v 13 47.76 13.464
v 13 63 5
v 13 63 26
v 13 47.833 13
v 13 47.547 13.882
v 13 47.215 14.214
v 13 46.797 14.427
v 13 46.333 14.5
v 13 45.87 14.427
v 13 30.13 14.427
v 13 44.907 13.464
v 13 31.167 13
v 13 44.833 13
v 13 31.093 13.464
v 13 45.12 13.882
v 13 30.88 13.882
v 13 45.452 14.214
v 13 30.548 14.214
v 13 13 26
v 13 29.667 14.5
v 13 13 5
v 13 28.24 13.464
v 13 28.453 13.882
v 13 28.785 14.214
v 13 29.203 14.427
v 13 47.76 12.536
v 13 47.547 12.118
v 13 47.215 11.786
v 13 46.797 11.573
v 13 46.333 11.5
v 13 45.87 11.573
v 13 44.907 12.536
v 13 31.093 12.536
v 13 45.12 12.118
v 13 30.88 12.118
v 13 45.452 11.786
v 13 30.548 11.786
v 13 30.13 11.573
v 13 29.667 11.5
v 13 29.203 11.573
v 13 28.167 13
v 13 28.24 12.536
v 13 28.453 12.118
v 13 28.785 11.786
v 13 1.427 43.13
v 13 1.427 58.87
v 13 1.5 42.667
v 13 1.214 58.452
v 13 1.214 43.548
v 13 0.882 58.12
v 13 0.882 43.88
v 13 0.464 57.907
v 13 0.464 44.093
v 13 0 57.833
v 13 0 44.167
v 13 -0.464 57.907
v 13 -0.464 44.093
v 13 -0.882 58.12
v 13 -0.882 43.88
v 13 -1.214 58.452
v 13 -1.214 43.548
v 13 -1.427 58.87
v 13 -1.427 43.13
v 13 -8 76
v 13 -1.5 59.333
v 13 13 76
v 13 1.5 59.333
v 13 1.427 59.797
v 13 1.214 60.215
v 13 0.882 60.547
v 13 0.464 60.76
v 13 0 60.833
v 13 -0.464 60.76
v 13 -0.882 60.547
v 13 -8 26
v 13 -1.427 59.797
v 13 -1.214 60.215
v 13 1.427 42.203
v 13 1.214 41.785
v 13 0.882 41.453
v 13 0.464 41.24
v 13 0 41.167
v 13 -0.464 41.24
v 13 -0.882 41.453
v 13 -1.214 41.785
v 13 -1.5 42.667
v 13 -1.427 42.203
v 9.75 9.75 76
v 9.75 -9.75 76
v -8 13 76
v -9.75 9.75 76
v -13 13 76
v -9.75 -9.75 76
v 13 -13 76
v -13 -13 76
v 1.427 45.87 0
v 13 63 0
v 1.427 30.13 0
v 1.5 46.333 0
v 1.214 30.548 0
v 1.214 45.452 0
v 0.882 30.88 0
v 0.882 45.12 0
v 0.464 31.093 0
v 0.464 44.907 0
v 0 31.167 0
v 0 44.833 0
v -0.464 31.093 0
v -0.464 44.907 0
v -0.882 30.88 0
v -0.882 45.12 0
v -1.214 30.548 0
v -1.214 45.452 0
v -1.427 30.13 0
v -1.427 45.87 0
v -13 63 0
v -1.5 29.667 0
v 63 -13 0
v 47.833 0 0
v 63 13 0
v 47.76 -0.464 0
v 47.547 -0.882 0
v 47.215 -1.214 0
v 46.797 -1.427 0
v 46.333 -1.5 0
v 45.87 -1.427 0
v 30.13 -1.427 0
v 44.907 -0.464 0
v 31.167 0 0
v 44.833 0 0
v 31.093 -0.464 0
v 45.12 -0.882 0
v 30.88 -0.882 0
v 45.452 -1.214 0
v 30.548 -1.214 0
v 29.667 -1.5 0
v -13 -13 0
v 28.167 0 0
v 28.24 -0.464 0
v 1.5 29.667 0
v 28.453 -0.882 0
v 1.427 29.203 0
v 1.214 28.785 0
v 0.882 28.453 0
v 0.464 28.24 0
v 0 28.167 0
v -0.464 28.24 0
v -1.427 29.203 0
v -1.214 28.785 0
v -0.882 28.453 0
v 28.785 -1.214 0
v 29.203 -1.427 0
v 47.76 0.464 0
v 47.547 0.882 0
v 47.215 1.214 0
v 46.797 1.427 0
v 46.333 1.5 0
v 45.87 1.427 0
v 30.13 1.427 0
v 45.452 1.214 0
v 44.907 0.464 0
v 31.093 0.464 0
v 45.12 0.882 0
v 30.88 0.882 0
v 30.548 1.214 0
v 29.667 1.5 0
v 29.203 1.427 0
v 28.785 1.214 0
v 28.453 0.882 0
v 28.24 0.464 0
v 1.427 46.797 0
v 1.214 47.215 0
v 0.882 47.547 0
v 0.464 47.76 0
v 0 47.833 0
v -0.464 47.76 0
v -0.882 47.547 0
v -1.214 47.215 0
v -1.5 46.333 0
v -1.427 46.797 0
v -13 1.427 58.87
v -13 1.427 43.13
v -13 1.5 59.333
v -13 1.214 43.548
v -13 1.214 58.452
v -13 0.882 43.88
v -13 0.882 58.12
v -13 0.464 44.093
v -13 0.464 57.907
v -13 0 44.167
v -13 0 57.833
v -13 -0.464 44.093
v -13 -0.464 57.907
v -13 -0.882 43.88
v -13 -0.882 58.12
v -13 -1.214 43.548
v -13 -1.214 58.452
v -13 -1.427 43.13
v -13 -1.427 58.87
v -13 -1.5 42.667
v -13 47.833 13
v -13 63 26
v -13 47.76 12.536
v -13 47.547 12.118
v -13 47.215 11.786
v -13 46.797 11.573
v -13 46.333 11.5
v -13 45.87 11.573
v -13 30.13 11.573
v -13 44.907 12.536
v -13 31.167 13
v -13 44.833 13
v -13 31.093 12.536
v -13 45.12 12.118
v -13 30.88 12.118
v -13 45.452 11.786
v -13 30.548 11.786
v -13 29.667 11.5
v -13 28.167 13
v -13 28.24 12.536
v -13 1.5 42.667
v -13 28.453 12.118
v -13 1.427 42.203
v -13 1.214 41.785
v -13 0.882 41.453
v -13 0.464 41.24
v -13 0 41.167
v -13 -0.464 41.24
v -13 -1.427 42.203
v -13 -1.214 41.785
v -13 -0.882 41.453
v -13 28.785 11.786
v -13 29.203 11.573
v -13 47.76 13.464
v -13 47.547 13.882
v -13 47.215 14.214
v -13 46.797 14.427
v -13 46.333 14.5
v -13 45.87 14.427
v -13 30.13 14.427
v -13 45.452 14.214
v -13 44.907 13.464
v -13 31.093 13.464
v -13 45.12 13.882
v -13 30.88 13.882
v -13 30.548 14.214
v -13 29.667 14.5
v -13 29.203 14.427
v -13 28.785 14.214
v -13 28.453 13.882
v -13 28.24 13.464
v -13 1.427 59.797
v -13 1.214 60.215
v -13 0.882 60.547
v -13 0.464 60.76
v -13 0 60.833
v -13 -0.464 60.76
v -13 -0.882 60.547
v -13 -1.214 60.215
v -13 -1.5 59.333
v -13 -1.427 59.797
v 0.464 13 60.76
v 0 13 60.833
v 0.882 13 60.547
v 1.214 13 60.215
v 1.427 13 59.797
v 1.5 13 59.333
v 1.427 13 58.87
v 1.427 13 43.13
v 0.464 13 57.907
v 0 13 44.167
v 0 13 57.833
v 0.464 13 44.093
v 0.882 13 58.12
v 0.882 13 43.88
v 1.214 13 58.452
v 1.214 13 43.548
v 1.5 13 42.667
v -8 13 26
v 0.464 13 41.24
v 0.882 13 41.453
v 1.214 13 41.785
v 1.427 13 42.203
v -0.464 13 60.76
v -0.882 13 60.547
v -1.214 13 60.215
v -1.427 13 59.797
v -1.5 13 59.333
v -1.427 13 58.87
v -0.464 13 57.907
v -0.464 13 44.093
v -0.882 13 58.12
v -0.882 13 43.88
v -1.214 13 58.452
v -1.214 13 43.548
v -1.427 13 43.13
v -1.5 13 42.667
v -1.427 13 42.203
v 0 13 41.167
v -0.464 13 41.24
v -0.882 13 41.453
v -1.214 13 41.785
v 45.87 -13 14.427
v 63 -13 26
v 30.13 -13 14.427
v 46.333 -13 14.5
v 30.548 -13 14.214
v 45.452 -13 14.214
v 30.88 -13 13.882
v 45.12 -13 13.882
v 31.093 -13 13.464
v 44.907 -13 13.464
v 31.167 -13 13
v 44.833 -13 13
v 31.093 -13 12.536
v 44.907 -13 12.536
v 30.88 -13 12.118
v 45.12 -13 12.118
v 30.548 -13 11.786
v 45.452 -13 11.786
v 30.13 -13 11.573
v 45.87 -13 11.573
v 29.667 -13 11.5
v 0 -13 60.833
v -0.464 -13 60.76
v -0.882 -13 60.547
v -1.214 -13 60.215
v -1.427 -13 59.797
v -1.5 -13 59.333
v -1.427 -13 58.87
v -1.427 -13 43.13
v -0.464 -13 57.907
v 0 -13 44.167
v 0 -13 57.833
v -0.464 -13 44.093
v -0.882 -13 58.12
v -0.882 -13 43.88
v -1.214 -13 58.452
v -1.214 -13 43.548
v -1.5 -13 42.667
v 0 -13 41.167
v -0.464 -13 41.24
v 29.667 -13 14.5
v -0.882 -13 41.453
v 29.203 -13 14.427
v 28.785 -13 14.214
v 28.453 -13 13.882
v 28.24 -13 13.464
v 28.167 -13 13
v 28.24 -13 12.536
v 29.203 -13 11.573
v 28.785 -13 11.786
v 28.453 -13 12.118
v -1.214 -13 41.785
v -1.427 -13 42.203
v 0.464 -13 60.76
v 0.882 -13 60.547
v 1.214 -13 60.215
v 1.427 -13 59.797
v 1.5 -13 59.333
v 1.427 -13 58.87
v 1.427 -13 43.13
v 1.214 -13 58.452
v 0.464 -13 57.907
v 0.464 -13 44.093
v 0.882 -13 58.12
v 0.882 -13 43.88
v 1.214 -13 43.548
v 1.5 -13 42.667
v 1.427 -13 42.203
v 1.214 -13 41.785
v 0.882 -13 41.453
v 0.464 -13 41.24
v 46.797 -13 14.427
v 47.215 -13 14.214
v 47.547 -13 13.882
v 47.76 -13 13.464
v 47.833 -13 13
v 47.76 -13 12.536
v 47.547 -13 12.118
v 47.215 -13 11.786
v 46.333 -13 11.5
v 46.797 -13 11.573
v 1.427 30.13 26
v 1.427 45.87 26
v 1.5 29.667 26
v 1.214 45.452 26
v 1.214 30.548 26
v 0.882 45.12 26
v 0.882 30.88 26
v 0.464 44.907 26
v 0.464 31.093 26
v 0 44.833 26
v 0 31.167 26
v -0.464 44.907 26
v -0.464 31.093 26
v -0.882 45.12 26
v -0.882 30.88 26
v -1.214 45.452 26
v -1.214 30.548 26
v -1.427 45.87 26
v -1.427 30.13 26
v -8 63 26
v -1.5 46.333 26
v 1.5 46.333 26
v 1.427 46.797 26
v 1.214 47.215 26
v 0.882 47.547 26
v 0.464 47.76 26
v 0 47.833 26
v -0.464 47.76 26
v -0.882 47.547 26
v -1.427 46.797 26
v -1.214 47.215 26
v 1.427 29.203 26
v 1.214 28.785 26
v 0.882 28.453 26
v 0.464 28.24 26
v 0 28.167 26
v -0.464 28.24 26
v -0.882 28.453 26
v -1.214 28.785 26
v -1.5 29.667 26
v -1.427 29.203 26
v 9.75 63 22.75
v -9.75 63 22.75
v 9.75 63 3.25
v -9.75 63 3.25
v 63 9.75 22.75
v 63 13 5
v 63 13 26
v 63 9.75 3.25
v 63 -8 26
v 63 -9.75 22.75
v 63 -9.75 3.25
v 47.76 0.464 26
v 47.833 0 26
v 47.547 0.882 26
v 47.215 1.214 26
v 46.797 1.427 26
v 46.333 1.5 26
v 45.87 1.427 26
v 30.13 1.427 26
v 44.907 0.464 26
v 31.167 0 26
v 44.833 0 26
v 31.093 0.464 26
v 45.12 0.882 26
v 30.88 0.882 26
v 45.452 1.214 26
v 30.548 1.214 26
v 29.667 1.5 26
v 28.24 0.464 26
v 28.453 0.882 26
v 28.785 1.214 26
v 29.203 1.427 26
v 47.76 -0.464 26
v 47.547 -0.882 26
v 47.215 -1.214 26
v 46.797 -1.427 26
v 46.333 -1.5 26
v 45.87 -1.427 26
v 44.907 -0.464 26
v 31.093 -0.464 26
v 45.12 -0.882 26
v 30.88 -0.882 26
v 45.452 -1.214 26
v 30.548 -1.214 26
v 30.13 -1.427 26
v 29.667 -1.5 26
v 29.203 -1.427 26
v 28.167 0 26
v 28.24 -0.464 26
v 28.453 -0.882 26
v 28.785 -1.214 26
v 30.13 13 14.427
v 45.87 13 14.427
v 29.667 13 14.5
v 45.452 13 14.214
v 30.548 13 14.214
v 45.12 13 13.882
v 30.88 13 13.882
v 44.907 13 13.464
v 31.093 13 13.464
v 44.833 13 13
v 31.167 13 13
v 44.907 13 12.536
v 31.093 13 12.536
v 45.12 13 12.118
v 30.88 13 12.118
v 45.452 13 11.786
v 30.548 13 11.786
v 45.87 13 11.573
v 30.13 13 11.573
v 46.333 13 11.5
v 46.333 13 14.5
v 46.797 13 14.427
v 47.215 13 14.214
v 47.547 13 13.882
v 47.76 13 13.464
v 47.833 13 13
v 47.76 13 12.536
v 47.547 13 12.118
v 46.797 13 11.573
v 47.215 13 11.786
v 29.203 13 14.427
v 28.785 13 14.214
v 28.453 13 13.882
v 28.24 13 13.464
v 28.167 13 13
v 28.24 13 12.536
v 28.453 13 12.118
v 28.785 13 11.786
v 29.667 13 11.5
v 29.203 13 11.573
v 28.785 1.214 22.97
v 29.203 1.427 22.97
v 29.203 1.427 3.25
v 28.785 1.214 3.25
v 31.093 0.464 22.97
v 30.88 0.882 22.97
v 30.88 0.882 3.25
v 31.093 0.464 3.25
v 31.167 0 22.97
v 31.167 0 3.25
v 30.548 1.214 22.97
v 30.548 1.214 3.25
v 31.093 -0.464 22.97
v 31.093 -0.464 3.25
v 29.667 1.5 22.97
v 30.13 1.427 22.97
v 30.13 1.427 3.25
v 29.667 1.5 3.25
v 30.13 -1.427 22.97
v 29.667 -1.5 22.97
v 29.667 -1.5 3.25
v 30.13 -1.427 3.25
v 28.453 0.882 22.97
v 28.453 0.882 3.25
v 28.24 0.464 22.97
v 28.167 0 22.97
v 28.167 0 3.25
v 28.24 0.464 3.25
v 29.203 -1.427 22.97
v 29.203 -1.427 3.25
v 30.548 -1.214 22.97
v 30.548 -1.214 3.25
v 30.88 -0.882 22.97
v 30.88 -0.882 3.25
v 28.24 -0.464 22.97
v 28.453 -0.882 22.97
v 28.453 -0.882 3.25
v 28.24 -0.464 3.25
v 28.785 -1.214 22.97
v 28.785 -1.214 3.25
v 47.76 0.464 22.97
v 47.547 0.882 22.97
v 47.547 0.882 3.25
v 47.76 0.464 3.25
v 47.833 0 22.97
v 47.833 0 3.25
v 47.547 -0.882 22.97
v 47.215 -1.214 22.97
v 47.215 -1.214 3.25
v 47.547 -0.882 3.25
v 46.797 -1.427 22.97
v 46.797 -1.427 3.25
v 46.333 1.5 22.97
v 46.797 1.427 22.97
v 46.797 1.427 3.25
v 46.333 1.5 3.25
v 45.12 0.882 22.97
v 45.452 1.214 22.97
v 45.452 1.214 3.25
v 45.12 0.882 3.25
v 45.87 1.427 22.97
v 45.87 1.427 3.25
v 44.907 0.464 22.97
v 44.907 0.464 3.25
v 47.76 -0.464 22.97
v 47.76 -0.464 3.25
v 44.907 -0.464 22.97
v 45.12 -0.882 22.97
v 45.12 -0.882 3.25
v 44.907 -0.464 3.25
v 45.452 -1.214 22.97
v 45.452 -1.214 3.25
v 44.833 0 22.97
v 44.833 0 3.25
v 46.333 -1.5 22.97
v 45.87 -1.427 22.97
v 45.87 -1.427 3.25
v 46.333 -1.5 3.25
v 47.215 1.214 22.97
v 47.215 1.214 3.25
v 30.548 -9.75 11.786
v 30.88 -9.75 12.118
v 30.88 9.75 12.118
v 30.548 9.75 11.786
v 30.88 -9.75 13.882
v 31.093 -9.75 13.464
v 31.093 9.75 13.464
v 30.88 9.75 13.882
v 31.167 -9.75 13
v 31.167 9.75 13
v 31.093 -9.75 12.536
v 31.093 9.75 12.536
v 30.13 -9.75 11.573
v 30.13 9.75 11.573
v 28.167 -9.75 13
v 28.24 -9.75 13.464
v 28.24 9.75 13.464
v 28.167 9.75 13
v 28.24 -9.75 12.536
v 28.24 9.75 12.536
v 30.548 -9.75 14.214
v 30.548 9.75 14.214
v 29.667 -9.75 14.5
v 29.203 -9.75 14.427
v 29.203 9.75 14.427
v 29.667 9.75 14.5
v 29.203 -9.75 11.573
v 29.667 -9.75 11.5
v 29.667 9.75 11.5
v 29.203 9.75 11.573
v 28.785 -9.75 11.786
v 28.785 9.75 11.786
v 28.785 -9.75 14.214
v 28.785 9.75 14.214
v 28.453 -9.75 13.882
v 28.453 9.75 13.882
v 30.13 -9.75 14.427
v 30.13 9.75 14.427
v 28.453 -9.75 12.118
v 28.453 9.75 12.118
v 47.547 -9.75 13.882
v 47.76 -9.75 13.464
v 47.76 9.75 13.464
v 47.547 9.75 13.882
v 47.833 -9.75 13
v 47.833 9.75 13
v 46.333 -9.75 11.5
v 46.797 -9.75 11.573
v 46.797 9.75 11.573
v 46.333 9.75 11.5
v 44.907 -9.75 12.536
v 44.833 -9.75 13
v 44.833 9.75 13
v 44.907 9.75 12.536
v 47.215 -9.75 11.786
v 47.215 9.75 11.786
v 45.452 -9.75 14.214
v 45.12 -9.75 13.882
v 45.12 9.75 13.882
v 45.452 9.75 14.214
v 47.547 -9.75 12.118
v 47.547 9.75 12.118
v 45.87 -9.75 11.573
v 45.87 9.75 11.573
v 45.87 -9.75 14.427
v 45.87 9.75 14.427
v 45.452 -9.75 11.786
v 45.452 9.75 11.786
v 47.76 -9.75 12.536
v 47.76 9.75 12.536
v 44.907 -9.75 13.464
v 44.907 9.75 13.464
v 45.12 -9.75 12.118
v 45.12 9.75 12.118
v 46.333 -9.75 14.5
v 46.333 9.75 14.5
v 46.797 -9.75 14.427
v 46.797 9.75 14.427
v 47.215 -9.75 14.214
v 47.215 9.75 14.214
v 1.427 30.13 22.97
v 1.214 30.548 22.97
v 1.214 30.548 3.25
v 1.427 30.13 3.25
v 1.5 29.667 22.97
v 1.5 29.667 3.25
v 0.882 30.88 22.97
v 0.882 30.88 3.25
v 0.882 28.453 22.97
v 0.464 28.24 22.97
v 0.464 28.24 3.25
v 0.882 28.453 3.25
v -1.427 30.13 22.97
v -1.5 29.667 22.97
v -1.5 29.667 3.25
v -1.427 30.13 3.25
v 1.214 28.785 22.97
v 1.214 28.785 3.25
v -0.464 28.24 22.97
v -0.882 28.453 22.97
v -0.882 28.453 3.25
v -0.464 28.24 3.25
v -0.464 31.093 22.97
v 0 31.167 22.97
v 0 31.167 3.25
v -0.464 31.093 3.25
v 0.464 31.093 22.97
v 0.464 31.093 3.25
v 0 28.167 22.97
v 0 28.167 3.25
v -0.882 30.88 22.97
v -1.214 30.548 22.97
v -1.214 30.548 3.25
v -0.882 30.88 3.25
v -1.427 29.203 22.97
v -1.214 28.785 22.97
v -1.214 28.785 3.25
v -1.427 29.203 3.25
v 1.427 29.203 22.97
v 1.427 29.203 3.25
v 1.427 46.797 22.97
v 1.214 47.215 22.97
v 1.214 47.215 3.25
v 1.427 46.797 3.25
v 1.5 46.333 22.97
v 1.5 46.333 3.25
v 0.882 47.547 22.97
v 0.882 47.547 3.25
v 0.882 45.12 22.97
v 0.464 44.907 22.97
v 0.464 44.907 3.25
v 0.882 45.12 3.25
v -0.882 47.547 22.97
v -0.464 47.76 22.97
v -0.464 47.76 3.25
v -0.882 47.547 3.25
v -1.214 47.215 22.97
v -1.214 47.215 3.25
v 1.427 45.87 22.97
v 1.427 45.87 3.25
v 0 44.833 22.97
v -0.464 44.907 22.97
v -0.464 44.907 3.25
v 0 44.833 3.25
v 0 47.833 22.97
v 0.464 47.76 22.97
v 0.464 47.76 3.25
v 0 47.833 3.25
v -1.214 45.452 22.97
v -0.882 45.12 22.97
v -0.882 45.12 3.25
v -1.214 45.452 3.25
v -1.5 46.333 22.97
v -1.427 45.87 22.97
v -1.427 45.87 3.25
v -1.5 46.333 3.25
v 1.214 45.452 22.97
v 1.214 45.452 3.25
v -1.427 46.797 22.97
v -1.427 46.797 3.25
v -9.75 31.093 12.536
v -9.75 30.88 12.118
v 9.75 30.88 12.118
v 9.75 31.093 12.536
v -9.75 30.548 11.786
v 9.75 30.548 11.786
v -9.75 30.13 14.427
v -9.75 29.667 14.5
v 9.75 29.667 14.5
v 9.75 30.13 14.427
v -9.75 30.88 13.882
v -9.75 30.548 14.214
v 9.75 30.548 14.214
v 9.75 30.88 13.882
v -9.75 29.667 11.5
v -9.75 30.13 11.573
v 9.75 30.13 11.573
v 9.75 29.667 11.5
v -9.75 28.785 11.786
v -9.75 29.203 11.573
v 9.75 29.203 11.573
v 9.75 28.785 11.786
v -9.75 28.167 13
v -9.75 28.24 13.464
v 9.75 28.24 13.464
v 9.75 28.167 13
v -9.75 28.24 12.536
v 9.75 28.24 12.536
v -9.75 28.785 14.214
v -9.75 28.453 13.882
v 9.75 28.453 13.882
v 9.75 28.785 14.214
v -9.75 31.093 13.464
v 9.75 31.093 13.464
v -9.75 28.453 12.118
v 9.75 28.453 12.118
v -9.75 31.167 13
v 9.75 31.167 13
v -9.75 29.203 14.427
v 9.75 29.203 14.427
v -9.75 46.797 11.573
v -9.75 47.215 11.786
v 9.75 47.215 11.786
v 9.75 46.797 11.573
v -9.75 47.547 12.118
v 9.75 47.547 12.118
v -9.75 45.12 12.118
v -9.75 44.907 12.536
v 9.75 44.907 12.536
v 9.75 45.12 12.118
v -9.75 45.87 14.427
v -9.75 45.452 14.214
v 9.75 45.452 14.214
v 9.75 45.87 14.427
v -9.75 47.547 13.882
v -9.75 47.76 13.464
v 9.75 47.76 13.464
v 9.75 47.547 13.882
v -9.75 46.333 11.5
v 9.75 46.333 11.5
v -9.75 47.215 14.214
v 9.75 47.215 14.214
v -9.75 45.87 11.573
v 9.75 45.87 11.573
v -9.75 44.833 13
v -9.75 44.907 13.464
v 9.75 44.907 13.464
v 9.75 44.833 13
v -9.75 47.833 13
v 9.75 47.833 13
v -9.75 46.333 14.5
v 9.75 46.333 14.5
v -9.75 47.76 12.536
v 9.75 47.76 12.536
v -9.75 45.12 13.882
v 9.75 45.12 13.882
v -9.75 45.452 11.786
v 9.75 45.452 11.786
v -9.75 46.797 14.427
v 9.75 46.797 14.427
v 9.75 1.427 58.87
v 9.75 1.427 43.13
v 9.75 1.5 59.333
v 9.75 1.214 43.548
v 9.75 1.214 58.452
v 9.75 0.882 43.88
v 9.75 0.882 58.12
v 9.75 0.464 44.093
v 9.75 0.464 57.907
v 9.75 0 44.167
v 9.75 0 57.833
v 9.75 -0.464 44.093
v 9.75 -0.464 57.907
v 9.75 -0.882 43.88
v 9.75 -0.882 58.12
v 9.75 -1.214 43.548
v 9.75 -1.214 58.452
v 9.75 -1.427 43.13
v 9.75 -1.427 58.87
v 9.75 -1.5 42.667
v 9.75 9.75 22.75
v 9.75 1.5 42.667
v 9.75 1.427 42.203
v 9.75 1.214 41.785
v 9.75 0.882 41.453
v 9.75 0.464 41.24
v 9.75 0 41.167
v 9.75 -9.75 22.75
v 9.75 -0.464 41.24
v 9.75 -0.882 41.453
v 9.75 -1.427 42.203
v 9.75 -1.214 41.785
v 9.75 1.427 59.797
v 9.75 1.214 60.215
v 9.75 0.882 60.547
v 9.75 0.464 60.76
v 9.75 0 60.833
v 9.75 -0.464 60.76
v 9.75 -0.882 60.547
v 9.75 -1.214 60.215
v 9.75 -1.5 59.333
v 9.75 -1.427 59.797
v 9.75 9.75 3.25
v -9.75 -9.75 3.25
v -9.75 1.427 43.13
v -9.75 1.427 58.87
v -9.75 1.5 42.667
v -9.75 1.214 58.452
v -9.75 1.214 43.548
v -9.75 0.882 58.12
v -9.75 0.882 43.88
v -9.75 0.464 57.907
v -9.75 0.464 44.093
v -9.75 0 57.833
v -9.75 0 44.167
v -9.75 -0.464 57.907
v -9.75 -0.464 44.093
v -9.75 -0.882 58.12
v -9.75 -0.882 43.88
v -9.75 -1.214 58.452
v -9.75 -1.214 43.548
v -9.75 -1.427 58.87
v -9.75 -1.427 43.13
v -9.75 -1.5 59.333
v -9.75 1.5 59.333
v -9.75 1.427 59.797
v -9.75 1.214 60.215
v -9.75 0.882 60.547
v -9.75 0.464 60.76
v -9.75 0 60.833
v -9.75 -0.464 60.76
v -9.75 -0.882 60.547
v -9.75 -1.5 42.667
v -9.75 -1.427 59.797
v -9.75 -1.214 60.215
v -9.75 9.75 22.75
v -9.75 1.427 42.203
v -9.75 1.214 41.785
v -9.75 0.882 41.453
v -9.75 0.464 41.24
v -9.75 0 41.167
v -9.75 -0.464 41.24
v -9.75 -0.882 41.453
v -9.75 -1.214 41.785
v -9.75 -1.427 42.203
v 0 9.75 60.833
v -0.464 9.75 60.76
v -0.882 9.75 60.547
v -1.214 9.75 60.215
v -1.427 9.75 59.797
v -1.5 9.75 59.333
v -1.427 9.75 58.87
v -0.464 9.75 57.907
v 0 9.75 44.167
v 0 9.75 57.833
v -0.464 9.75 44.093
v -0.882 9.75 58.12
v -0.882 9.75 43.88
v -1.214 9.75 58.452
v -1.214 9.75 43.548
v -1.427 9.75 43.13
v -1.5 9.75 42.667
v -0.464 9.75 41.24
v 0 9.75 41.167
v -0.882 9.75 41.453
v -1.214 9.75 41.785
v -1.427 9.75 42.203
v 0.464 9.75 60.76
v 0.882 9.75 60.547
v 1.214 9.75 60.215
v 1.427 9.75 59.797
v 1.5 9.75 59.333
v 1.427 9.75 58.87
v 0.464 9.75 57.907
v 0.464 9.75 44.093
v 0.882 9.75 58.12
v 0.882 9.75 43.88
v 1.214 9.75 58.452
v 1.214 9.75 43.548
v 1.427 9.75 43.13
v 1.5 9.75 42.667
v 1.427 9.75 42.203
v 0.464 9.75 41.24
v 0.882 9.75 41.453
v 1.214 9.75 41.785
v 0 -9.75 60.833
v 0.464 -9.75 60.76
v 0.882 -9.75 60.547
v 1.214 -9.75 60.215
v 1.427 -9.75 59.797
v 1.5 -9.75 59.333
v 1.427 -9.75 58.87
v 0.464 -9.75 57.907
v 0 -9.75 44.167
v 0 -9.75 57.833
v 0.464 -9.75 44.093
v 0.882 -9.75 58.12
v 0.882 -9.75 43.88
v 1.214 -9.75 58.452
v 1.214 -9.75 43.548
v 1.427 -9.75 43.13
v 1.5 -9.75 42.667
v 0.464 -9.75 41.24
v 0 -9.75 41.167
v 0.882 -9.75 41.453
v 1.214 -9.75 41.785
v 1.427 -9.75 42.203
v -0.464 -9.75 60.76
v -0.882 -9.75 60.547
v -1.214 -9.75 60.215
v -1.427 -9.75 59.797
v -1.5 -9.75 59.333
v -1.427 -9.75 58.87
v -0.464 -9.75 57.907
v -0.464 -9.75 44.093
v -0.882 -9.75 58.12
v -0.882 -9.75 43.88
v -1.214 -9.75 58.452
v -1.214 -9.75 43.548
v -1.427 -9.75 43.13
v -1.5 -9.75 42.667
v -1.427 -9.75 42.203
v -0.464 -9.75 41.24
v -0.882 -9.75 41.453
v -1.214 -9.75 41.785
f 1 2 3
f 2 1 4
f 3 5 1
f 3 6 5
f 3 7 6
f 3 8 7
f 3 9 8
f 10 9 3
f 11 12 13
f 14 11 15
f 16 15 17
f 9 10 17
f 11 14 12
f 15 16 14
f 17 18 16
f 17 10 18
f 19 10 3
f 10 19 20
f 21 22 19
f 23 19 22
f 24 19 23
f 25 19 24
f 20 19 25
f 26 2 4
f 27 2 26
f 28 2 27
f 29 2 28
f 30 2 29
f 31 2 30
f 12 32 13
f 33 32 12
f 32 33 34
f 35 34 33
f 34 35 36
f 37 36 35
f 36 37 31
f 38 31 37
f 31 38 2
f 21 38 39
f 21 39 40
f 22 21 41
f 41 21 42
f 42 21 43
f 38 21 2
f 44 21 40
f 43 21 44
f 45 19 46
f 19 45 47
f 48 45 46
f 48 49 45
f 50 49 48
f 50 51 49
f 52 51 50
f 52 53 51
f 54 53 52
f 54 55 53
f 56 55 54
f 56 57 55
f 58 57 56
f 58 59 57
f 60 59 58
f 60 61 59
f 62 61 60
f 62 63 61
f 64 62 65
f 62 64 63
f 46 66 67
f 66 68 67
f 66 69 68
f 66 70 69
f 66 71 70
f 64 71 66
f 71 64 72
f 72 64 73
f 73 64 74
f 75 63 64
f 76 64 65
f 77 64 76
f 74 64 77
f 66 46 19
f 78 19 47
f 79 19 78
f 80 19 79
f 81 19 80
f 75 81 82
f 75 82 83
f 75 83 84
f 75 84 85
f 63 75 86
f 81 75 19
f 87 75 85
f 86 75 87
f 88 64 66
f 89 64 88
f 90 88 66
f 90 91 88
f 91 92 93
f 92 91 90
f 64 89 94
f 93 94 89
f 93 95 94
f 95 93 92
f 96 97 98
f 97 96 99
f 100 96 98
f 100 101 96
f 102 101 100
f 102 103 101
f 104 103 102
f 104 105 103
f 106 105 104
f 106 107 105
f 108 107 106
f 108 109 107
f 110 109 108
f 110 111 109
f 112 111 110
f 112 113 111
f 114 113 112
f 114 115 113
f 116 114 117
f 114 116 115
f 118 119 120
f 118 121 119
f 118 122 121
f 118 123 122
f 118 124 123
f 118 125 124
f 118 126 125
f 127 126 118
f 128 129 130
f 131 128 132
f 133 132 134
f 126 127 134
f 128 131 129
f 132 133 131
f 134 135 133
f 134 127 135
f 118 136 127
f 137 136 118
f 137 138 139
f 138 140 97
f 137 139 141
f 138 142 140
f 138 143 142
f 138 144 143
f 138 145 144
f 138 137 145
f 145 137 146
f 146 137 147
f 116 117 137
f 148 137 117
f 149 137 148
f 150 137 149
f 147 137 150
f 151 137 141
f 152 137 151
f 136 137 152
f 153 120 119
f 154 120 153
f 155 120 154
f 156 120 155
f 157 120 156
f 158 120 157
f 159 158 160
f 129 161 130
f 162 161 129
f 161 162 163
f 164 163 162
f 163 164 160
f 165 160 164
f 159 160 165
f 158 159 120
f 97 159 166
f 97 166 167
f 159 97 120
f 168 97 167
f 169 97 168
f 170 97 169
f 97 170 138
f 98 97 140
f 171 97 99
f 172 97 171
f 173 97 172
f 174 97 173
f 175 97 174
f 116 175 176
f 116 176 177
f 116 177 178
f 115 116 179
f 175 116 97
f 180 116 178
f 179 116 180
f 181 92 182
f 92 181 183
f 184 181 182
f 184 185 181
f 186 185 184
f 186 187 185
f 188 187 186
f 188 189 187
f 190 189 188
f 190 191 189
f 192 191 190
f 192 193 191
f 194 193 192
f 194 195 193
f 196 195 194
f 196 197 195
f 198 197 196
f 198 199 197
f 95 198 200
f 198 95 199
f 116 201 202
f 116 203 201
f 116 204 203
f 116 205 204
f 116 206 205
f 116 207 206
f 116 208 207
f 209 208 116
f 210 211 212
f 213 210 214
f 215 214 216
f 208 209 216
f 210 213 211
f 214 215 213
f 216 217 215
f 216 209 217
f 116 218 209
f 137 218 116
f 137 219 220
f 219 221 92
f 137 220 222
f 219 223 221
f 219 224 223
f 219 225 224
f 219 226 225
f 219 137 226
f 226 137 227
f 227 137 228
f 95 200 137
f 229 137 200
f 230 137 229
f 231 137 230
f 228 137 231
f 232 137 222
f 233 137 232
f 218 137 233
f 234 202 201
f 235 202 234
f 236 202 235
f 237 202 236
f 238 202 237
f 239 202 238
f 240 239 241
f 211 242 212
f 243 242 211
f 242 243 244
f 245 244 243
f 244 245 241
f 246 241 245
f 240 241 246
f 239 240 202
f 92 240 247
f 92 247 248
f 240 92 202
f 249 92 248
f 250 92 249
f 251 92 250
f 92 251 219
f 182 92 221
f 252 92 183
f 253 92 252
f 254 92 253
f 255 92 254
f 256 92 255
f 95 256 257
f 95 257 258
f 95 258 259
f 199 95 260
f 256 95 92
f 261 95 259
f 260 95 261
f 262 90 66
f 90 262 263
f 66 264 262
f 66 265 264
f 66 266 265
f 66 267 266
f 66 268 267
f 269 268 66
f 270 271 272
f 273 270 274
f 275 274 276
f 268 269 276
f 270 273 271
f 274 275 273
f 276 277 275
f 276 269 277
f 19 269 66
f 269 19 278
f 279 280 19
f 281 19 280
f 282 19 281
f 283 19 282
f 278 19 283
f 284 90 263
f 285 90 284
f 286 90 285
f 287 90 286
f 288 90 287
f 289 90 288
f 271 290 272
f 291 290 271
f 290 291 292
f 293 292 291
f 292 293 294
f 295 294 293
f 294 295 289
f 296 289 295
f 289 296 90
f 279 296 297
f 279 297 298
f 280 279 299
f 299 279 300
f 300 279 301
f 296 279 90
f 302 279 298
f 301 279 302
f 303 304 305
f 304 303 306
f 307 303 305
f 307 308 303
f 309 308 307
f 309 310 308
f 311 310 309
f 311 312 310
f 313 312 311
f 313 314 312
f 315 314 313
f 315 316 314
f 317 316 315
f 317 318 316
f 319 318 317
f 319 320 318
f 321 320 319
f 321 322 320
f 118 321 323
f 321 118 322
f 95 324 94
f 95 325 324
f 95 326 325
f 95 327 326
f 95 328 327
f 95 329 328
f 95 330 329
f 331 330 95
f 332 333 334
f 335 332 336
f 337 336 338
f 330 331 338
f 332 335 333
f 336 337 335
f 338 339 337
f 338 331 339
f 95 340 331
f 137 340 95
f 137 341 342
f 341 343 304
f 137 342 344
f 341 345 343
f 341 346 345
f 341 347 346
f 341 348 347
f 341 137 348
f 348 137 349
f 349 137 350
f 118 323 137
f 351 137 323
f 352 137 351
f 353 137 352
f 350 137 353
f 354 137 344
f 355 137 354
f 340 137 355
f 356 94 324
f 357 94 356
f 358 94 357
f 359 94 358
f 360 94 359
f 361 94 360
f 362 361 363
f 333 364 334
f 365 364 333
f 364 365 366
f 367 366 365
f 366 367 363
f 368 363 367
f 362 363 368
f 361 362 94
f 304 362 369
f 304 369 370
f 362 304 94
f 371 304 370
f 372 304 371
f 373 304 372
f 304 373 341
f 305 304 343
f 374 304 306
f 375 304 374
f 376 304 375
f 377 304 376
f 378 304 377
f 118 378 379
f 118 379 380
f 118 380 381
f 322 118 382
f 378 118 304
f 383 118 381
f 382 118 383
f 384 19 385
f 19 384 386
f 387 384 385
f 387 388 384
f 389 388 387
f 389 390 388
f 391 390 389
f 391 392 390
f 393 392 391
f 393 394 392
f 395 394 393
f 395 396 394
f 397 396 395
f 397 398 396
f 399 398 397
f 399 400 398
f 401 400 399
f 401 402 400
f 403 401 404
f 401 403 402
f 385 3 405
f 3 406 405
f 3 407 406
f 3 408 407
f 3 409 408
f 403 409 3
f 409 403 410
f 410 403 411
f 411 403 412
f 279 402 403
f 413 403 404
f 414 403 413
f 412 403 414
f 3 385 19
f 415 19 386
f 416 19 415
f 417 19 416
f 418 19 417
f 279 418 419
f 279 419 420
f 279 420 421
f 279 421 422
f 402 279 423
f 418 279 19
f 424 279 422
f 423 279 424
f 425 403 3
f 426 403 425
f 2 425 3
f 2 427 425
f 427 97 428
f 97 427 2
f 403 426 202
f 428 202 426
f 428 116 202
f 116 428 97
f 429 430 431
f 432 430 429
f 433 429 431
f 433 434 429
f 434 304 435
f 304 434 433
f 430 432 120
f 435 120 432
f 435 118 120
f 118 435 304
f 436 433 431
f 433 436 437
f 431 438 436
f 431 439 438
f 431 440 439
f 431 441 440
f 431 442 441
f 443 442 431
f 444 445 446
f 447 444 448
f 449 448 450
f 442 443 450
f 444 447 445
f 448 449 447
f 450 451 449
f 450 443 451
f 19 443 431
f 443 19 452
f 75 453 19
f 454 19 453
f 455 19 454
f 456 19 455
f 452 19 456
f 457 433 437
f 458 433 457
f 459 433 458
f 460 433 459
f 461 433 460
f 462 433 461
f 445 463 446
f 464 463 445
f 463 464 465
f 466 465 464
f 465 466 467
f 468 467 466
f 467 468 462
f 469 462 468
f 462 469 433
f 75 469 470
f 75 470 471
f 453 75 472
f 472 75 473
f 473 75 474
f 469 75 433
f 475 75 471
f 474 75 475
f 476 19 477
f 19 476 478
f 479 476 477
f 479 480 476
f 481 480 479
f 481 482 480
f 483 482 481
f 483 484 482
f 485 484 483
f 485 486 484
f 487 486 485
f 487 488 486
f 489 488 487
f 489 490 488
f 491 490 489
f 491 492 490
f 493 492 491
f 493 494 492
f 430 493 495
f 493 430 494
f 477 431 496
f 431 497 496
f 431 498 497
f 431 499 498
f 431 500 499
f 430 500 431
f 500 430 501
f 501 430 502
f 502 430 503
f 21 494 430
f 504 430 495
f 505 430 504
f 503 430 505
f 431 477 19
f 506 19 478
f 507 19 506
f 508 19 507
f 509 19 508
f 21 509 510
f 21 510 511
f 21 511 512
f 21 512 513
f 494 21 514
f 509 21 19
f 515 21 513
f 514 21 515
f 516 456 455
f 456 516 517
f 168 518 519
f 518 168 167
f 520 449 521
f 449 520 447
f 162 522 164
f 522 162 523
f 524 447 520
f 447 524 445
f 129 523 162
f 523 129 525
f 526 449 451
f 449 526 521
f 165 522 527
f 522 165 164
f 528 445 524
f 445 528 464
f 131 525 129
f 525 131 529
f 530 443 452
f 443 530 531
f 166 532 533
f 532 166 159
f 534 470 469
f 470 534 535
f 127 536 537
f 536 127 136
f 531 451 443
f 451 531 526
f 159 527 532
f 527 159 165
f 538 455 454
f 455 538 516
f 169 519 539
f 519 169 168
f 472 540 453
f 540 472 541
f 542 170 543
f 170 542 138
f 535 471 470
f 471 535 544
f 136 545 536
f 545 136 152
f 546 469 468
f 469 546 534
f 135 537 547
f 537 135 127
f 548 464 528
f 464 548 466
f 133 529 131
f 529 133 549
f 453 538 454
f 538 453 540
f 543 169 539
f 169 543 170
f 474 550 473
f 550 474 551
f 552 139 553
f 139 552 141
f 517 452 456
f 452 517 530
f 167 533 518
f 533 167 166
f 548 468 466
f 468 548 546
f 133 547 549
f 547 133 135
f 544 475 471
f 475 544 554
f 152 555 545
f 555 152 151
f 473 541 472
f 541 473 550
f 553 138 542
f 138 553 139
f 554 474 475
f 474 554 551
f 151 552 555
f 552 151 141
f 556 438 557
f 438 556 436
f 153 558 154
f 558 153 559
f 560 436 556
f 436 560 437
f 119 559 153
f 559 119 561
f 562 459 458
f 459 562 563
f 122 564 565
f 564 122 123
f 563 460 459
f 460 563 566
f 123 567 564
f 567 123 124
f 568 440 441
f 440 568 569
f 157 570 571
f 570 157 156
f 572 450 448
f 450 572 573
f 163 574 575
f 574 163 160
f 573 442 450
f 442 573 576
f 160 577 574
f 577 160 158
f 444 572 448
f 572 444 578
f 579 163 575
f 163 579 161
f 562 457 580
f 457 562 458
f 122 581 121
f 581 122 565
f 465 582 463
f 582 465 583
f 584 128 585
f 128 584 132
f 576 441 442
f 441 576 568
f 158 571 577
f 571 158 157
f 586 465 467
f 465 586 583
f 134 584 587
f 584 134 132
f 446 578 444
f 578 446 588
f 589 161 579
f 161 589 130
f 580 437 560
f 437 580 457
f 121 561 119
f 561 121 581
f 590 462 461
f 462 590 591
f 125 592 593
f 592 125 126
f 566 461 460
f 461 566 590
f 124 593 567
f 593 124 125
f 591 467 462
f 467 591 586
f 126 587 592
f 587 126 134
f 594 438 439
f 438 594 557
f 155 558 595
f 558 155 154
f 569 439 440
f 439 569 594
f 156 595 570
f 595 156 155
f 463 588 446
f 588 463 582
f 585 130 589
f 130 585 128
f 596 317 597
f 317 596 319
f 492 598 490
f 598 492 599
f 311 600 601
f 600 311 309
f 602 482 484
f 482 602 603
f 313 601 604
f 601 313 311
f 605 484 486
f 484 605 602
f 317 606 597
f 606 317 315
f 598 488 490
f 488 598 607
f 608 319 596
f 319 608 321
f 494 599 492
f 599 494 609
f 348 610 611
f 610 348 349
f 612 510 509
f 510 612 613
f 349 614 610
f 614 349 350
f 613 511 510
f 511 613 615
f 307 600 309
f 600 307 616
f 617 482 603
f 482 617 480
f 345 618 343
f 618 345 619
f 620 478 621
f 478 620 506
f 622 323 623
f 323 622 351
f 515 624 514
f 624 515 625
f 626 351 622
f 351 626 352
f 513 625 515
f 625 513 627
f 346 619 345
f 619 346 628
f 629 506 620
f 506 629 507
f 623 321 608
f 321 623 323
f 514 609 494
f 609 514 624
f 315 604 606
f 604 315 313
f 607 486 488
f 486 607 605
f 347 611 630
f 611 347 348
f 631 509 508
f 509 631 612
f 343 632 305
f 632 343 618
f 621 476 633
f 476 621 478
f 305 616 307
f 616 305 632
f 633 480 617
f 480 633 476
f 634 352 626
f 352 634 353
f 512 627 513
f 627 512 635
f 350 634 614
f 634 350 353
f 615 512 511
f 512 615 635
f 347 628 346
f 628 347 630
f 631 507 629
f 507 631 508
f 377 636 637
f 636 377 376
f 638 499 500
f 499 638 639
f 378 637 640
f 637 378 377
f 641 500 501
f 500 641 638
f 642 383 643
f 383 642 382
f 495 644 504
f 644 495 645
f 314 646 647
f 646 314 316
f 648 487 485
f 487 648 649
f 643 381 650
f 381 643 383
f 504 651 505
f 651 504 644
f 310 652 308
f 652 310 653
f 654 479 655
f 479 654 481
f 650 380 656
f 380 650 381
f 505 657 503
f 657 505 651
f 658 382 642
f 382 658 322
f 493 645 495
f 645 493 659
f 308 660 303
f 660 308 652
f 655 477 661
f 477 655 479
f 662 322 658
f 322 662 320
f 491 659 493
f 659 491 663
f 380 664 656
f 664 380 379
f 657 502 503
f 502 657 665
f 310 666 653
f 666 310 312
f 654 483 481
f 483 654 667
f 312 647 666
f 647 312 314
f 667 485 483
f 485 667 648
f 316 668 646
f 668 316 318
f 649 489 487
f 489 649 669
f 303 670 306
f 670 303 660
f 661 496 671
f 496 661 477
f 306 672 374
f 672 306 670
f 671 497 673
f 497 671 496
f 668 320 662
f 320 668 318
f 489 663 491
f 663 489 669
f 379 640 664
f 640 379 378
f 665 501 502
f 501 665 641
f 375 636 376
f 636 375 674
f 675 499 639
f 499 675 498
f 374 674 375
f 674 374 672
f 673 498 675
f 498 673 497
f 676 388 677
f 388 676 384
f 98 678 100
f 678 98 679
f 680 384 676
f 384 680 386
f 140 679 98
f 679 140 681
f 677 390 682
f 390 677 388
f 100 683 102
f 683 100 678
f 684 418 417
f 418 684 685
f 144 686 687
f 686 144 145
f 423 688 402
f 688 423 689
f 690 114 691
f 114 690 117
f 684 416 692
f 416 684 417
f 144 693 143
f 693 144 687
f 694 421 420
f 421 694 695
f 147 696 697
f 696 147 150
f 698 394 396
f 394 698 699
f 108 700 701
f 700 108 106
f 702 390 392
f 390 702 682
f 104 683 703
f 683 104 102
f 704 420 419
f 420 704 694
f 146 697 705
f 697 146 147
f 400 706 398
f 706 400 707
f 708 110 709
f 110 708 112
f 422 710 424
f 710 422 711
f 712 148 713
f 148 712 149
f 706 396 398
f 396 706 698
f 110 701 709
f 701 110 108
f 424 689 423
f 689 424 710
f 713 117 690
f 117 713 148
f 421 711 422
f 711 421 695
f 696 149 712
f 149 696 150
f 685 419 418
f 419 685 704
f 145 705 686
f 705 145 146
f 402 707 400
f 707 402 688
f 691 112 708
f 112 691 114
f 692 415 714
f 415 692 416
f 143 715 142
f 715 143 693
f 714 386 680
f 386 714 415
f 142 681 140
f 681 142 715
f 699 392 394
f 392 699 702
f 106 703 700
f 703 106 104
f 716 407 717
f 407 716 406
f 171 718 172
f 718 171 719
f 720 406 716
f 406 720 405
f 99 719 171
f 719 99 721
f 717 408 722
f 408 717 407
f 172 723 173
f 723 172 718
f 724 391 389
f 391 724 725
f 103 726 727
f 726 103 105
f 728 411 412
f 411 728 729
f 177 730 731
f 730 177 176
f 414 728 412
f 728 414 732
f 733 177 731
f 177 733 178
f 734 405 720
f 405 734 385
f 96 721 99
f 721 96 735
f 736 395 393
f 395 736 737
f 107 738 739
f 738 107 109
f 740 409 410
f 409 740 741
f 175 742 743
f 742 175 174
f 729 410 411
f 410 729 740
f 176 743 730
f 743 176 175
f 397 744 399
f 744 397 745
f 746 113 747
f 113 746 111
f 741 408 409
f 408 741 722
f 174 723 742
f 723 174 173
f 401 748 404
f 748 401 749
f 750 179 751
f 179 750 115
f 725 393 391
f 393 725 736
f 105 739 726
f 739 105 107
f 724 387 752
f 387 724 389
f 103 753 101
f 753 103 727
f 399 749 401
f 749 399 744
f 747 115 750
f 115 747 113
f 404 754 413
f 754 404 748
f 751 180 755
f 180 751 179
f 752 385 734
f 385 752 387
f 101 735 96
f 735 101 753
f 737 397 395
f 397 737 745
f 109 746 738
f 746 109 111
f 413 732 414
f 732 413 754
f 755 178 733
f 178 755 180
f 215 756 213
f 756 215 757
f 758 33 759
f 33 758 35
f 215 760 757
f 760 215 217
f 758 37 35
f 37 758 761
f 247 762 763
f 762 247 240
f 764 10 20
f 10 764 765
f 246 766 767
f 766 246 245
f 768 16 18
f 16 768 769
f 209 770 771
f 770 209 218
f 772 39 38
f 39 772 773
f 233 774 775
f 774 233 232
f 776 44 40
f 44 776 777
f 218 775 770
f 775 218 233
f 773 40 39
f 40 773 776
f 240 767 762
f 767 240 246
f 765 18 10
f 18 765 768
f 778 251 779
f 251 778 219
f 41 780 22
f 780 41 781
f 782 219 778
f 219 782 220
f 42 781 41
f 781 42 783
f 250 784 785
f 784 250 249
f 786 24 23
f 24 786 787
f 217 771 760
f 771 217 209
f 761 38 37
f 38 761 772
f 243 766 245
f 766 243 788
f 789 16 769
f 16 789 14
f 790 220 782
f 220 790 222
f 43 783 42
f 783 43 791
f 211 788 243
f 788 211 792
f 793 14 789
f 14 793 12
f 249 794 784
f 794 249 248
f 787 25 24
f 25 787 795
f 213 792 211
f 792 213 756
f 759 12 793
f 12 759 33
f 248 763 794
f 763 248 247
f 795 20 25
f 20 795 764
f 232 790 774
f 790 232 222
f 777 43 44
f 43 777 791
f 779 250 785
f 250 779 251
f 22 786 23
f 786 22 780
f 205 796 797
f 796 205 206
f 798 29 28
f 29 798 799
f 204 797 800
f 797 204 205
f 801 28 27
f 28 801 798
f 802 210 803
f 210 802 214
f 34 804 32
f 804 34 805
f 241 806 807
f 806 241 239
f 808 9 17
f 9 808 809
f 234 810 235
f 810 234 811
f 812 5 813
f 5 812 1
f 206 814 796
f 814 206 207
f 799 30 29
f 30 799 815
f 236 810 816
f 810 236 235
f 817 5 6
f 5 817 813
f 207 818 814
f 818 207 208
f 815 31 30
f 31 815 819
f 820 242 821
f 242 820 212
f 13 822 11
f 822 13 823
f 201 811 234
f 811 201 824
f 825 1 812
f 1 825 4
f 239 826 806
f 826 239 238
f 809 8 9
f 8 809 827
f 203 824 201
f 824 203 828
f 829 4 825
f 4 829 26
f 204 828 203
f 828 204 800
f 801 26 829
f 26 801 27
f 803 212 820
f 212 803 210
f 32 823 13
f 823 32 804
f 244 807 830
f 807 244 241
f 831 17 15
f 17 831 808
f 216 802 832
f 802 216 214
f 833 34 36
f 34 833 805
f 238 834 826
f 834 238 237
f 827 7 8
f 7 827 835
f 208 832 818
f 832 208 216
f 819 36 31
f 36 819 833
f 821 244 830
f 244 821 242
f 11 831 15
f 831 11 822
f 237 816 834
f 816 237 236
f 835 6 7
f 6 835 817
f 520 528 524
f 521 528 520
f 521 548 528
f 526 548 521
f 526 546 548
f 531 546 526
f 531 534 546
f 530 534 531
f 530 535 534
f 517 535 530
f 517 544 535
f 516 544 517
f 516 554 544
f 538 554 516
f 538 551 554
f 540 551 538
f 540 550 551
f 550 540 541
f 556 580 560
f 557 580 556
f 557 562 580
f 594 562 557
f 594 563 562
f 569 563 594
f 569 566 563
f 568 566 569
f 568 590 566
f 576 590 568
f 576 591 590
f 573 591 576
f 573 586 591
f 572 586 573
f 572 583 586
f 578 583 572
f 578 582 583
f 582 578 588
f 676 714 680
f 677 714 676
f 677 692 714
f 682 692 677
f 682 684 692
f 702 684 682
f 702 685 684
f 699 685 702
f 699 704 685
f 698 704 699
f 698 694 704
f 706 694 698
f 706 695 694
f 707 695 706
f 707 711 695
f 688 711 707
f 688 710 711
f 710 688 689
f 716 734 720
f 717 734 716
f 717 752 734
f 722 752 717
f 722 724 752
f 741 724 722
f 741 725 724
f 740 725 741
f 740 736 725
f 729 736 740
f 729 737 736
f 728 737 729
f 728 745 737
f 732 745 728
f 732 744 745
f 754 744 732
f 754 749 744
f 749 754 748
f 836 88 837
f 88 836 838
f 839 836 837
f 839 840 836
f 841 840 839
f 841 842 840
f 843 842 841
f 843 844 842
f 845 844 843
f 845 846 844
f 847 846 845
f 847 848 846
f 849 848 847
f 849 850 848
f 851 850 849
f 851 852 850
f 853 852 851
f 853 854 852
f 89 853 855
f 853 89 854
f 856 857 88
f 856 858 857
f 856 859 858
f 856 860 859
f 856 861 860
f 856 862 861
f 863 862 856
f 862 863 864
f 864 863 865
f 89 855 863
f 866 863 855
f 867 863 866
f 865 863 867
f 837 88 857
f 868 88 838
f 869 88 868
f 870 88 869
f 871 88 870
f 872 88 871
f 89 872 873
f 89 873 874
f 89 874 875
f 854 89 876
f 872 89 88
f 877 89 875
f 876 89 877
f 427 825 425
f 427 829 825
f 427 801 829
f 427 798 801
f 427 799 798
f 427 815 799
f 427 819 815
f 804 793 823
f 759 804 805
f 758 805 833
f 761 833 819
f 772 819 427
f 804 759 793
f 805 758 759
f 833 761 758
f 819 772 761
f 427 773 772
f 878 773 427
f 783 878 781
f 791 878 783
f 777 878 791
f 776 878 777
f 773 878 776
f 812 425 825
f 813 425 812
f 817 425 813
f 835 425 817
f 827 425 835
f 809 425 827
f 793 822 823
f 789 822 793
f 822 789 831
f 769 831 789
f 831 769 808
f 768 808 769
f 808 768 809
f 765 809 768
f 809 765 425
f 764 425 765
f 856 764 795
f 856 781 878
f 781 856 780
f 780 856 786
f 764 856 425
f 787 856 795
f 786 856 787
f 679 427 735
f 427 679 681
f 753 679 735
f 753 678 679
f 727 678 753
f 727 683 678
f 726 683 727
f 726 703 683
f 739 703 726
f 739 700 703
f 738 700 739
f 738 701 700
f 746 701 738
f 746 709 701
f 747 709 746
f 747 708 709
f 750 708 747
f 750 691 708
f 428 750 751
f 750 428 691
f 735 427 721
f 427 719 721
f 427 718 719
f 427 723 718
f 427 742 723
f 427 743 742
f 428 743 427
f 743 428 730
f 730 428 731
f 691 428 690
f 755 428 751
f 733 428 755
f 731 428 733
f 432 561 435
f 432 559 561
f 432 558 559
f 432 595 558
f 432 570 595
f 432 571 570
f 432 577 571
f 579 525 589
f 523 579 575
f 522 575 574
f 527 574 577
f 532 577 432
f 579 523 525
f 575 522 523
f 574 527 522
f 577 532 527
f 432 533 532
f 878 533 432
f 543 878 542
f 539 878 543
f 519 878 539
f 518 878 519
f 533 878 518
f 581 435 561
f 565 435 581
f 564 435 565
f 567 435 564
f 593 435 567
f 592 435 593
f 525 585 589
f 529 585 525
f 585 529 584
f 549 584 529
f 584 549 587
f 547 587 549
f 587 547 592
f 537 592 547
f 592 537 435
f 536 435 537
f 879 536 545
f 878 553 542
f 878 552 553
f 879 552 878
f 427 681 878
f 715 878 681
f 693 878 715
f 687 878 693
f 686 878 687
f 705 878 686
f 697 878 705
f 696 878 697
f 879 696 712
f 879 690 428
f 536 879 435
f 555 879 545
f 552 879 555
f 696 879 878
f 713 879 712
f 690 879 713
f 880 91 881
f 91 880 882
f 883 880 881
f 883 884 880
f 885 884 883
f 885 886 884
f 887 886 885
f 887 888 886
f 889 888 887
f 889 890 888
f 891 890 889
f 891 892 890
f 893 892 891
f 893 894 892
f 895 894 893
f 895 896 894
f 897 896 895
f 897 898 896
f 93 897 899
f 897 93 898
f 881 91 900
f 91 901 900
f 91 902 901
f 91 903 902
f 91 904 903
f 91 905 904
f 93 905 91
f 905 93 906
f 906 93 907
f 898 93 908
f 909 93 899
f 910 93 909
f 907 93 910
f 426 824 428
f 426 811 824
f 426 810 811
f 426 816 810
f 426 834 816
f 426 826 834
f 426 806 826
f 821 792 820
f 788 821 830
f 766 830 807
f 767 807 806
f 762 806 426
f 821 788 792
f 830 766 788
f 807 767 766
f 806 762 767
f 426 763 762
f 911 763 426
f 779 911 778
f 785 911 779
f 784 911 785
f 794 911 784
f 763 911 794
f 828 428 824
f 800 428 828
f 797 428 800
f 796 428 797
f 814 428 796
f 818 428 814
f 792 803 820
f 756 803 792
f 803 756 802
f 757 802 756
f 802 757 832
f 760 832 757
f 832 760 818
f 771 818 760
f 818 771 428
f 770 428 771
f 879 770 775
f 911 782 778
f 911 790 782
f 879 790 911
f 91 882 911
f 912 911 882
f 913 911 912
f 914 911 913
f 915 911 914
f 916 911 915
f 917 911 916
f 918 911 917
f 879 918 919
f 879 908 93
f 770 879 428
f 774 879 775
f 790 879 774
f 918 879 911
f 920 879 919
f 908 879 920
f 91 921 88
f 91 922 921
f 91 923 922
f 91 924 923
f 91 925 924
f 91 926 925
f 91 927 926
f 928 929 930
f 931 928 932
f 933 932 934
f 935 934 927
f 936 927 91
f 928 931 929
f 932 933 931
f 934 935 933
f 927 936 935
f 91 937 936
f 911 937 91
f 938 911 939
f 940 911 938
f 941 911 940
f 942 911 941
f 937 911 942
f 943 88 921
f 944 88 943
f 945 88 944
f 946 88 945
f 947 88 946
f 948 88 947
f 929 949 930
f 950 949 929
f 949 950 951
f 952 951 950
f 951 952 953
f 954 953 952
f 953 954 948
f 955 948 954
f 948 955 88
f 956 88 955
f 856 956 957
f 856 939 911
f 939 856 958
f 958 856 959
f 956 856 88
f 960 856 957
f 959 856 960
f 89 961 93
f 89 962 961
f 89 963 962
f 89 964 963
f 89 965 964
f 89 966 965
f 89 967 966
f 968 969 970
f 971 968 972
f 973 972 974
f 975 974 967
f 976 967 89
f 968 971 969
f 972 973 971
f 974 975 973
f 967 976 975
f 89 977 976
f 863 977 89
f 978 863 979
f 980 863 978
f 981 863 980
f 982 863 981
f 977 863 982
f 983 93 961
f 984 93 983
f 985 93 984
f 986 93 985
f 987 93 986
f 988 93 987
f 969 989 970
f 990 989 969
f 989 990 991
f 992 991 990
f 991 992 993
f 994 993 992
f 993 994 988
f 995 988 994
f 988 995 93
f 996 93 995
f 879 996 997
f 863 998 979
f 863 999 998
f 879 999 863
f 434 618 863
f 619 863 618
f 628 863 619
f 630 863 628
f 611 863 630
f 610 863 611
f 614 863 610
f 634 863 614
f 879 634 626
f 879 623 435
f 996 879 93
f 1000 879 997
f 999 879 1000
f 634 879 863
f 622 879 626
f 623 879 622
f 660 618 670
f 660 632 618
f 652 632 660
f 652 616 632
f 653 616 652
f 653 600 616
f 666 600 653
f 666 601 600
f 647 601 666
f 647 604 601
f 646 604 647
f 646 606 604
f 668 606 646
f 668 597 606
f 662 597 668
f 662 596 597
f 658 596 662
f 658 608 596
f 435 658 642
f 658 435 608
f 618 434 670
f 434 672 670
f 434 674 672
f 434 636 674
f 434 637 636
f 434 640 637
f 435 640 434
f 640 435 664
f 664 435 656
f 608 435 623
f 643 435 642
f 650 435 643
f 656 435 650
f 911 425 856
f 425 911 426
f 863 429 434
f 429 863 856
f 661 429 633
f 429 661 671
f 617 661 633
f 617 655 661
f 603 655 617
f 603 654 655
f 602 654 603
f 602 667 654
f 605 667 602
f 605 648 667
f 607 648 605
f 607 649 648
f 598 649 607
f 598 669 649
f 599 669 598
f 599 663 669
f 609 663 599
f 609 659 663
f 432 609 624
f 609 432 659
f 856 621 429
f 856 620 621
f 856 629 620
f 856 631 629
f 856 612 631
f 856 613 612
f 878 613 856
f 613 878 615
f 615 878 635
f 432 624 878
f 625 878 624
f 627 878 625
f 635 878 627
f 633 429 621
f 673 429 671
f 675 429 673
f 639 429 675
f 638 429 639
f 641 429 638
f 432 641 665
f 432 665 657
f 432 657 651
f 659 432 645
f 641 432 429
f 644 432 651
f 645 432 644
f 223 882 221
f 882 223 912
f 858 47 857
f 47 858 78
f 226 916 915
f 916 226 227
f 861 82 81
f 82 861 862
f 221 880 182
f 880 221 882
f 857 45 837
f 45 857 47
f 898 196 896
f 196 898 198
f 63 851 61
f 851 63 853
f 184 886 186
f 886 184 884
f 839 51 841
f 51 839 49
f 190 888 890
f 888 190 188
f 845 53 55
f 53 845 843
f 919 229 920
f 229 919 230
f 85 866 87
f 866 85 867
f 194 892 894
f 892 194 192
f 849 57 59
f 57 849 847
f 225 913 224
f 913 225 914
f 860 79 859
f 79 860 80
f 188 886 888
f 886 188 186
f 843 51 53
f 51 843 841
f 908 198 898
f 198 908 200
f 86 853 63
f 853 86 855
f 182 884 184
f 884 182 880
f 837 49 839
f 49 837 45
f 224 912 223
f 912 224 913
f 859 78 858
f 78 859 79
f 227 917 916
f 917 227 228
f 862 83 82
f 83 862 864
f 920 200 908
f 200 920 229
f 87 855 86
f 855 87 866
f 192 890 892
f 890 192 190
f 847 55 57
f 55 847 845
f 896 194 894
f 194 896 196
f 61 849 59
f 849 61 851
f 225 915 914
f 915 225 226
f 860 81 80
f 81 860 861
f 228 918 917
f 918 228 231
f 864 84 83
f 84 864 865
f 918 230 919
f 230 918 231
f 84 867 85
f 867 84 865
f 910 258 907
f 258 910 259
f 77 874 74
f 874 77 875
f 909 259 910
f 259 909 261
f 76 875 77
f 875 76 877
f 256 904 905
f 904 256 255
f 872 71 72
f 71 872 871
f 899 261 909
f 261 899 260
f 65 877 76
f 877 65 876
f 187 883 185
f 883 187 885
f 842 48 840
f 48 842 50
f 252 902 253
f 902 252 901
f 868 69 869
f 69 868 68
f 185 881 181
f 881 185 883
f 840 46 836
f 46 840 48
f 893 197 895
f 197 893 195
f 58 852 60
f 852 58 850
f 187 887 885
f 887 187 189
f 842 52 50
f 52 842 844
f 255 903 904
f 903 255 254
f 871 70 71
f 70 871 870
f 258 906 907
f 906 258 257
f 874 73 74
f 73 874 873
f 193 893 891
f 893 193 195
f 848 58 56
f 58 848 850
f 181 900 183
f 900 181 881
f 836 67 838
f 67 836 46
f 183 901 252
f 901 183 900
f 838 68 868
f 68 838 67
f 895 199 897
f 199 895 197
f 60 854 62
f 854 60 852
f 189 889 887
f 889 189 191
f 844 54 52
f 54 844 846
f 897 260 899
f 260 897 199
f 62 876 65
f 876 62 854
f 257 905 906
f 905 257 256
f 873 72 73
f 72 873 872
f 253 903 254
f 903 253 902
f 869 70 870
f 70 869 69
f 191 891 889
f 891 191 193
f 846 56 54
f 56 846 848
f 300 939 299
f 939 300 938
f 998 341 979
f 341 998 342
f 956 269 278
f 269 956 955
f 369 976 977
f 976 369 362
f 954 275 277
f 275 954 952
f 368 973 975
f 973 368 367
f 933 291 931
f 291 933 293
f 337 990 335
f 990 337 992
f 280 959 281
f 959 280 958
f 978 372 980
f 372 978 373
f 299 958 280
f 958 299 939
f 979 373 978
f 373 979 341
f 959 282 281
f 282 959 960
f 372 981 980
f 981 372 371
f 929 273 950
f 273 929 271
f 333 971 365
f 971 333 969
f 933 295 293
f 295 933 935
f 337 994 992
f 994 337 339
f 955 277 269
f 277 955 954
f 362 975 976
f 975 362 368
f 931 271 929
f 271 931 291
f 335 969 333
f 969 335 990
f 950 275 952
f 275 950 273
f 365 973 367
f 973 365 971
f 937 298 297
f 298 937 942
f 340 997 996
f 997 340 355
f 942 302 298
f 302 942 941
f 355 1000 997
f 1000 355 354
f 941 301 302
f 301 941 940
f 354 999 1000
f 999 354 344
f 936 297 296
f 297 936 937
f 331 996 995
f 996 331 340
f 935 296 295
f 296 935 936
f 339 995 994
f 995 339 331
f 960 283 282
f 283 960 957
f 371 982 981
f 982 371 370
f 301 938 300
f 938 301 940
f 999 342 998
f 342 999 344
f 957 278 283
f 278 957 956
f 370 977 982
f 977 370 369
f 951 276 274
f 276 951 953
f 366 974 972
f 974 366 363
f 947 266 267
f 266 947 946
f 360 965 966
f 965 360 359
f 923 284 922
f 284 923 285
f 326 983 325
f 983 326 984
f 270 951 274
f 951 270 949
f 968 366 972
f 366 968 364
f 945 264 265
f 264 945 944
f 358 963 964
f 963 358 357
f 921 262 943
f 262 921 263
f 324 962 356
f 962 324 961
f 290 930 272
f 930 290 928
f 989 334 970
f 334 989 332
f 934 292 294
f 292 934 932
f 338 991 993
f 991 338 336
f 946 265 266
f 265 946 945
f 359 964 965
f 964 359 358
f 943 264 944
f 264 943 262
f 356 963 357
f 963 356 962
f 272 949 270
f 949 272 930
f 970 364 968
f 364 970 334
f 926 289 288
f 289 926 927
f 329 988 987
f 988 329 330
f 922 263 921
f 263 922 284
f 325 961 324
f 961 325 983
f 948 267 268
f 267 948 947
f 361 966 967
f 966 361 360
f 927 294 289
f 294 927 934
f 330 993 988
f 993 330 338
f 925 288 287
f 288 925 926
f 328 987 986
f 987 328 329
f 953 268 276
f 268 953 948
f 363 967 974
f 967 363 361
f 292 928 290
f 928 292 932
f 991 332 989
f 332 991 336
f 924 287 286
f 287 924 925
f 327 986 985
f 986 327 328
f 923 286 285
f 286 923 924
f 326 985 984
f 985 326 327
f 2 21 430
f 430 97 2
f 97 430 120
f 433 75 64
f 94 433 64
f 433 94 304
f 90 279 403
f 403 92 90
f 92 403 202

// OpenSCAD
// Designed by Nathaniel Stenzel April 21, 2019
// Thing 3577992

$fn=20;

  //////////////////////////
 // Customizer Settings: //
//////////////////////////

// All measurements are in mm.
// How big is the square tube or extrusion?
inner_size=19.5;
// How big do you want the mount to be around the square tube or extrusion?
outer_size=26;
// How much of the square tube or extrusion do you want inserted into this corner bracket?
insertion_depth=50;
// Do you want the vertical tube to have a bottom or do you want it to stick through?
have_bottom=1; // [1:Yes, 0:No]
// How big do you want the screw holes? (0 for none)
screw_size=3;
// How thick do you want the triangular braces? (0 for none)
fin_thickness=5; 
//Layer height which will be used to help add support
support_height=0.22;
//Should I add a thin support layer at the bottom of the horizontal holes?
hole_support=1; // [1:Yes, 0:No]

module fin(height,width,thickness) {
    linear_extrude(height = thickness)
        polygon(points=[[0,0],[0,width],[height,0]]);
}

module corner(inner=0,outer=0,depth=0,bottom=true,add_hole_support=true,layer_height=0,screws=5,fins=5) {
union(){
    //tubes
    difference(){
        
        union() {
            translate([-outer/2,-outer/2,0])cube([outer,outer,outer+depth]); //Z tube
            translate([-outer/2,outer/2,0])cube([outer,depth,outer]); //X tube
            translate([outer/2,-outer/2,0])cube([depth,outer,outer]); //Y tube
        }
        //Z tube void
        if(bottom)
        {
            translate([-inner/2,-inner/2,(outer-inner)/2])cube([inner,inner,outer+depth]); 
            }
        else
        { //cut out the bottom of the Z tube shaft too
            translate([-inner/2,-inner/2,-1])cube([inner,inner,outer+depth+3]);             
        }
        translate([-inner/2,inner/2-1,(outer-inner)/2])cube([inner,depth+outer-inner+4,inner]); //X tube void
        translate([inner/2-1,-inner/2,(outer-inner)/2])cube([depth+outer-inner+4,inner,inner]); //Y tube void

        //Z tube shaft screw holes
        translate([0,0,depth/3+outer])rotate([0,-90,0])cylinder(d=screws,h=outer+5,center=true);
        translate([0,0,depth*2/3+outer])rotate([0,-90,0])cylinder(d=screws,h=outer+5,center=true);
        translate([0,0,depth/3+outer])rotate([90,0,0])cylinder(d=screws,h=outer+5,center=true);
        translate([0,0,depth*2/3+outer])rotate([90,0,0])cylinder(d=screws,h=outer+5,center=true);
        
        difference() {
            union() {

        //X tube shaft screw holes
                translate([depth/3+outer/2,0,-1])cylinder(d=screws,h=outer+3);
                translate([depth*2/3+outer/2,0,-1])cylinder(d=screws,h=outer+3);
                translate([depth/3+outer/2,0,outer/2])rotate([90,0,0])cylinder(d=screws,h=outer+3,center=true);
                translate([depth*2/3+outer/2,0,outer/2])rotate([90,0,0])cylinder(d=screws,h=outer+3,center=true);

                //Y tube shaft screw holes
                translate([0,depth/3+outer/2,-1])cylinder(d=screws,h=outer+3);
                translate([0,depth*2/3+outer/2,-1])cylinder(d=screws,h=outer+3);
                translate([0,depth/3+outer/2,outer/2])rotate([0,90,0])cylinder(d=screws,h=outer+3,center=true);
                translate([0,depth*2/3+outer/2,outer/2])rotate([0,90,0])cylinder(d=screws,h=outer+3,center=true);
            }
            if (add_hole_support) {
                translate([depth/3+outer/2,0,inner+(outer-inner)/2-1])cylinder(d=screws,h=layer_height+1);
                translate([depth*2/3+outer/2,0,inner+(outer-inner)/2-1])cylinder(d=screws,h=layer_height+1);
                translate([0,depth/3+outer/2,inner+(outer-inner)/2-1])cylinder(d=screws,h=layer_height+1);
                translate([0,depth*2/3+outer/2,inner+(outer-inner)/2-1])cylinder(d=screws,layer_height+1);
            }
        }
 
  }
        
    
    //tube supports  
    translate([outer/2,outer/2,0])fin(depth,depth,fins);
    translate([outer/2,fins-outer/2,outer])rotate([90,0,0])fin(depth,depth,fins);
    translate([fins-outer/2,outer/2,outer])rotate([0,-90,0])fin(depth,depth,fins);
}

}

corner(inner=inner_size,outer=outer_size,depth=insertion_depth,bottom=have_bottom,add_hole_support=hole_support,layer_height=support_height,screws=screw_size,fins=fin_thickness);
